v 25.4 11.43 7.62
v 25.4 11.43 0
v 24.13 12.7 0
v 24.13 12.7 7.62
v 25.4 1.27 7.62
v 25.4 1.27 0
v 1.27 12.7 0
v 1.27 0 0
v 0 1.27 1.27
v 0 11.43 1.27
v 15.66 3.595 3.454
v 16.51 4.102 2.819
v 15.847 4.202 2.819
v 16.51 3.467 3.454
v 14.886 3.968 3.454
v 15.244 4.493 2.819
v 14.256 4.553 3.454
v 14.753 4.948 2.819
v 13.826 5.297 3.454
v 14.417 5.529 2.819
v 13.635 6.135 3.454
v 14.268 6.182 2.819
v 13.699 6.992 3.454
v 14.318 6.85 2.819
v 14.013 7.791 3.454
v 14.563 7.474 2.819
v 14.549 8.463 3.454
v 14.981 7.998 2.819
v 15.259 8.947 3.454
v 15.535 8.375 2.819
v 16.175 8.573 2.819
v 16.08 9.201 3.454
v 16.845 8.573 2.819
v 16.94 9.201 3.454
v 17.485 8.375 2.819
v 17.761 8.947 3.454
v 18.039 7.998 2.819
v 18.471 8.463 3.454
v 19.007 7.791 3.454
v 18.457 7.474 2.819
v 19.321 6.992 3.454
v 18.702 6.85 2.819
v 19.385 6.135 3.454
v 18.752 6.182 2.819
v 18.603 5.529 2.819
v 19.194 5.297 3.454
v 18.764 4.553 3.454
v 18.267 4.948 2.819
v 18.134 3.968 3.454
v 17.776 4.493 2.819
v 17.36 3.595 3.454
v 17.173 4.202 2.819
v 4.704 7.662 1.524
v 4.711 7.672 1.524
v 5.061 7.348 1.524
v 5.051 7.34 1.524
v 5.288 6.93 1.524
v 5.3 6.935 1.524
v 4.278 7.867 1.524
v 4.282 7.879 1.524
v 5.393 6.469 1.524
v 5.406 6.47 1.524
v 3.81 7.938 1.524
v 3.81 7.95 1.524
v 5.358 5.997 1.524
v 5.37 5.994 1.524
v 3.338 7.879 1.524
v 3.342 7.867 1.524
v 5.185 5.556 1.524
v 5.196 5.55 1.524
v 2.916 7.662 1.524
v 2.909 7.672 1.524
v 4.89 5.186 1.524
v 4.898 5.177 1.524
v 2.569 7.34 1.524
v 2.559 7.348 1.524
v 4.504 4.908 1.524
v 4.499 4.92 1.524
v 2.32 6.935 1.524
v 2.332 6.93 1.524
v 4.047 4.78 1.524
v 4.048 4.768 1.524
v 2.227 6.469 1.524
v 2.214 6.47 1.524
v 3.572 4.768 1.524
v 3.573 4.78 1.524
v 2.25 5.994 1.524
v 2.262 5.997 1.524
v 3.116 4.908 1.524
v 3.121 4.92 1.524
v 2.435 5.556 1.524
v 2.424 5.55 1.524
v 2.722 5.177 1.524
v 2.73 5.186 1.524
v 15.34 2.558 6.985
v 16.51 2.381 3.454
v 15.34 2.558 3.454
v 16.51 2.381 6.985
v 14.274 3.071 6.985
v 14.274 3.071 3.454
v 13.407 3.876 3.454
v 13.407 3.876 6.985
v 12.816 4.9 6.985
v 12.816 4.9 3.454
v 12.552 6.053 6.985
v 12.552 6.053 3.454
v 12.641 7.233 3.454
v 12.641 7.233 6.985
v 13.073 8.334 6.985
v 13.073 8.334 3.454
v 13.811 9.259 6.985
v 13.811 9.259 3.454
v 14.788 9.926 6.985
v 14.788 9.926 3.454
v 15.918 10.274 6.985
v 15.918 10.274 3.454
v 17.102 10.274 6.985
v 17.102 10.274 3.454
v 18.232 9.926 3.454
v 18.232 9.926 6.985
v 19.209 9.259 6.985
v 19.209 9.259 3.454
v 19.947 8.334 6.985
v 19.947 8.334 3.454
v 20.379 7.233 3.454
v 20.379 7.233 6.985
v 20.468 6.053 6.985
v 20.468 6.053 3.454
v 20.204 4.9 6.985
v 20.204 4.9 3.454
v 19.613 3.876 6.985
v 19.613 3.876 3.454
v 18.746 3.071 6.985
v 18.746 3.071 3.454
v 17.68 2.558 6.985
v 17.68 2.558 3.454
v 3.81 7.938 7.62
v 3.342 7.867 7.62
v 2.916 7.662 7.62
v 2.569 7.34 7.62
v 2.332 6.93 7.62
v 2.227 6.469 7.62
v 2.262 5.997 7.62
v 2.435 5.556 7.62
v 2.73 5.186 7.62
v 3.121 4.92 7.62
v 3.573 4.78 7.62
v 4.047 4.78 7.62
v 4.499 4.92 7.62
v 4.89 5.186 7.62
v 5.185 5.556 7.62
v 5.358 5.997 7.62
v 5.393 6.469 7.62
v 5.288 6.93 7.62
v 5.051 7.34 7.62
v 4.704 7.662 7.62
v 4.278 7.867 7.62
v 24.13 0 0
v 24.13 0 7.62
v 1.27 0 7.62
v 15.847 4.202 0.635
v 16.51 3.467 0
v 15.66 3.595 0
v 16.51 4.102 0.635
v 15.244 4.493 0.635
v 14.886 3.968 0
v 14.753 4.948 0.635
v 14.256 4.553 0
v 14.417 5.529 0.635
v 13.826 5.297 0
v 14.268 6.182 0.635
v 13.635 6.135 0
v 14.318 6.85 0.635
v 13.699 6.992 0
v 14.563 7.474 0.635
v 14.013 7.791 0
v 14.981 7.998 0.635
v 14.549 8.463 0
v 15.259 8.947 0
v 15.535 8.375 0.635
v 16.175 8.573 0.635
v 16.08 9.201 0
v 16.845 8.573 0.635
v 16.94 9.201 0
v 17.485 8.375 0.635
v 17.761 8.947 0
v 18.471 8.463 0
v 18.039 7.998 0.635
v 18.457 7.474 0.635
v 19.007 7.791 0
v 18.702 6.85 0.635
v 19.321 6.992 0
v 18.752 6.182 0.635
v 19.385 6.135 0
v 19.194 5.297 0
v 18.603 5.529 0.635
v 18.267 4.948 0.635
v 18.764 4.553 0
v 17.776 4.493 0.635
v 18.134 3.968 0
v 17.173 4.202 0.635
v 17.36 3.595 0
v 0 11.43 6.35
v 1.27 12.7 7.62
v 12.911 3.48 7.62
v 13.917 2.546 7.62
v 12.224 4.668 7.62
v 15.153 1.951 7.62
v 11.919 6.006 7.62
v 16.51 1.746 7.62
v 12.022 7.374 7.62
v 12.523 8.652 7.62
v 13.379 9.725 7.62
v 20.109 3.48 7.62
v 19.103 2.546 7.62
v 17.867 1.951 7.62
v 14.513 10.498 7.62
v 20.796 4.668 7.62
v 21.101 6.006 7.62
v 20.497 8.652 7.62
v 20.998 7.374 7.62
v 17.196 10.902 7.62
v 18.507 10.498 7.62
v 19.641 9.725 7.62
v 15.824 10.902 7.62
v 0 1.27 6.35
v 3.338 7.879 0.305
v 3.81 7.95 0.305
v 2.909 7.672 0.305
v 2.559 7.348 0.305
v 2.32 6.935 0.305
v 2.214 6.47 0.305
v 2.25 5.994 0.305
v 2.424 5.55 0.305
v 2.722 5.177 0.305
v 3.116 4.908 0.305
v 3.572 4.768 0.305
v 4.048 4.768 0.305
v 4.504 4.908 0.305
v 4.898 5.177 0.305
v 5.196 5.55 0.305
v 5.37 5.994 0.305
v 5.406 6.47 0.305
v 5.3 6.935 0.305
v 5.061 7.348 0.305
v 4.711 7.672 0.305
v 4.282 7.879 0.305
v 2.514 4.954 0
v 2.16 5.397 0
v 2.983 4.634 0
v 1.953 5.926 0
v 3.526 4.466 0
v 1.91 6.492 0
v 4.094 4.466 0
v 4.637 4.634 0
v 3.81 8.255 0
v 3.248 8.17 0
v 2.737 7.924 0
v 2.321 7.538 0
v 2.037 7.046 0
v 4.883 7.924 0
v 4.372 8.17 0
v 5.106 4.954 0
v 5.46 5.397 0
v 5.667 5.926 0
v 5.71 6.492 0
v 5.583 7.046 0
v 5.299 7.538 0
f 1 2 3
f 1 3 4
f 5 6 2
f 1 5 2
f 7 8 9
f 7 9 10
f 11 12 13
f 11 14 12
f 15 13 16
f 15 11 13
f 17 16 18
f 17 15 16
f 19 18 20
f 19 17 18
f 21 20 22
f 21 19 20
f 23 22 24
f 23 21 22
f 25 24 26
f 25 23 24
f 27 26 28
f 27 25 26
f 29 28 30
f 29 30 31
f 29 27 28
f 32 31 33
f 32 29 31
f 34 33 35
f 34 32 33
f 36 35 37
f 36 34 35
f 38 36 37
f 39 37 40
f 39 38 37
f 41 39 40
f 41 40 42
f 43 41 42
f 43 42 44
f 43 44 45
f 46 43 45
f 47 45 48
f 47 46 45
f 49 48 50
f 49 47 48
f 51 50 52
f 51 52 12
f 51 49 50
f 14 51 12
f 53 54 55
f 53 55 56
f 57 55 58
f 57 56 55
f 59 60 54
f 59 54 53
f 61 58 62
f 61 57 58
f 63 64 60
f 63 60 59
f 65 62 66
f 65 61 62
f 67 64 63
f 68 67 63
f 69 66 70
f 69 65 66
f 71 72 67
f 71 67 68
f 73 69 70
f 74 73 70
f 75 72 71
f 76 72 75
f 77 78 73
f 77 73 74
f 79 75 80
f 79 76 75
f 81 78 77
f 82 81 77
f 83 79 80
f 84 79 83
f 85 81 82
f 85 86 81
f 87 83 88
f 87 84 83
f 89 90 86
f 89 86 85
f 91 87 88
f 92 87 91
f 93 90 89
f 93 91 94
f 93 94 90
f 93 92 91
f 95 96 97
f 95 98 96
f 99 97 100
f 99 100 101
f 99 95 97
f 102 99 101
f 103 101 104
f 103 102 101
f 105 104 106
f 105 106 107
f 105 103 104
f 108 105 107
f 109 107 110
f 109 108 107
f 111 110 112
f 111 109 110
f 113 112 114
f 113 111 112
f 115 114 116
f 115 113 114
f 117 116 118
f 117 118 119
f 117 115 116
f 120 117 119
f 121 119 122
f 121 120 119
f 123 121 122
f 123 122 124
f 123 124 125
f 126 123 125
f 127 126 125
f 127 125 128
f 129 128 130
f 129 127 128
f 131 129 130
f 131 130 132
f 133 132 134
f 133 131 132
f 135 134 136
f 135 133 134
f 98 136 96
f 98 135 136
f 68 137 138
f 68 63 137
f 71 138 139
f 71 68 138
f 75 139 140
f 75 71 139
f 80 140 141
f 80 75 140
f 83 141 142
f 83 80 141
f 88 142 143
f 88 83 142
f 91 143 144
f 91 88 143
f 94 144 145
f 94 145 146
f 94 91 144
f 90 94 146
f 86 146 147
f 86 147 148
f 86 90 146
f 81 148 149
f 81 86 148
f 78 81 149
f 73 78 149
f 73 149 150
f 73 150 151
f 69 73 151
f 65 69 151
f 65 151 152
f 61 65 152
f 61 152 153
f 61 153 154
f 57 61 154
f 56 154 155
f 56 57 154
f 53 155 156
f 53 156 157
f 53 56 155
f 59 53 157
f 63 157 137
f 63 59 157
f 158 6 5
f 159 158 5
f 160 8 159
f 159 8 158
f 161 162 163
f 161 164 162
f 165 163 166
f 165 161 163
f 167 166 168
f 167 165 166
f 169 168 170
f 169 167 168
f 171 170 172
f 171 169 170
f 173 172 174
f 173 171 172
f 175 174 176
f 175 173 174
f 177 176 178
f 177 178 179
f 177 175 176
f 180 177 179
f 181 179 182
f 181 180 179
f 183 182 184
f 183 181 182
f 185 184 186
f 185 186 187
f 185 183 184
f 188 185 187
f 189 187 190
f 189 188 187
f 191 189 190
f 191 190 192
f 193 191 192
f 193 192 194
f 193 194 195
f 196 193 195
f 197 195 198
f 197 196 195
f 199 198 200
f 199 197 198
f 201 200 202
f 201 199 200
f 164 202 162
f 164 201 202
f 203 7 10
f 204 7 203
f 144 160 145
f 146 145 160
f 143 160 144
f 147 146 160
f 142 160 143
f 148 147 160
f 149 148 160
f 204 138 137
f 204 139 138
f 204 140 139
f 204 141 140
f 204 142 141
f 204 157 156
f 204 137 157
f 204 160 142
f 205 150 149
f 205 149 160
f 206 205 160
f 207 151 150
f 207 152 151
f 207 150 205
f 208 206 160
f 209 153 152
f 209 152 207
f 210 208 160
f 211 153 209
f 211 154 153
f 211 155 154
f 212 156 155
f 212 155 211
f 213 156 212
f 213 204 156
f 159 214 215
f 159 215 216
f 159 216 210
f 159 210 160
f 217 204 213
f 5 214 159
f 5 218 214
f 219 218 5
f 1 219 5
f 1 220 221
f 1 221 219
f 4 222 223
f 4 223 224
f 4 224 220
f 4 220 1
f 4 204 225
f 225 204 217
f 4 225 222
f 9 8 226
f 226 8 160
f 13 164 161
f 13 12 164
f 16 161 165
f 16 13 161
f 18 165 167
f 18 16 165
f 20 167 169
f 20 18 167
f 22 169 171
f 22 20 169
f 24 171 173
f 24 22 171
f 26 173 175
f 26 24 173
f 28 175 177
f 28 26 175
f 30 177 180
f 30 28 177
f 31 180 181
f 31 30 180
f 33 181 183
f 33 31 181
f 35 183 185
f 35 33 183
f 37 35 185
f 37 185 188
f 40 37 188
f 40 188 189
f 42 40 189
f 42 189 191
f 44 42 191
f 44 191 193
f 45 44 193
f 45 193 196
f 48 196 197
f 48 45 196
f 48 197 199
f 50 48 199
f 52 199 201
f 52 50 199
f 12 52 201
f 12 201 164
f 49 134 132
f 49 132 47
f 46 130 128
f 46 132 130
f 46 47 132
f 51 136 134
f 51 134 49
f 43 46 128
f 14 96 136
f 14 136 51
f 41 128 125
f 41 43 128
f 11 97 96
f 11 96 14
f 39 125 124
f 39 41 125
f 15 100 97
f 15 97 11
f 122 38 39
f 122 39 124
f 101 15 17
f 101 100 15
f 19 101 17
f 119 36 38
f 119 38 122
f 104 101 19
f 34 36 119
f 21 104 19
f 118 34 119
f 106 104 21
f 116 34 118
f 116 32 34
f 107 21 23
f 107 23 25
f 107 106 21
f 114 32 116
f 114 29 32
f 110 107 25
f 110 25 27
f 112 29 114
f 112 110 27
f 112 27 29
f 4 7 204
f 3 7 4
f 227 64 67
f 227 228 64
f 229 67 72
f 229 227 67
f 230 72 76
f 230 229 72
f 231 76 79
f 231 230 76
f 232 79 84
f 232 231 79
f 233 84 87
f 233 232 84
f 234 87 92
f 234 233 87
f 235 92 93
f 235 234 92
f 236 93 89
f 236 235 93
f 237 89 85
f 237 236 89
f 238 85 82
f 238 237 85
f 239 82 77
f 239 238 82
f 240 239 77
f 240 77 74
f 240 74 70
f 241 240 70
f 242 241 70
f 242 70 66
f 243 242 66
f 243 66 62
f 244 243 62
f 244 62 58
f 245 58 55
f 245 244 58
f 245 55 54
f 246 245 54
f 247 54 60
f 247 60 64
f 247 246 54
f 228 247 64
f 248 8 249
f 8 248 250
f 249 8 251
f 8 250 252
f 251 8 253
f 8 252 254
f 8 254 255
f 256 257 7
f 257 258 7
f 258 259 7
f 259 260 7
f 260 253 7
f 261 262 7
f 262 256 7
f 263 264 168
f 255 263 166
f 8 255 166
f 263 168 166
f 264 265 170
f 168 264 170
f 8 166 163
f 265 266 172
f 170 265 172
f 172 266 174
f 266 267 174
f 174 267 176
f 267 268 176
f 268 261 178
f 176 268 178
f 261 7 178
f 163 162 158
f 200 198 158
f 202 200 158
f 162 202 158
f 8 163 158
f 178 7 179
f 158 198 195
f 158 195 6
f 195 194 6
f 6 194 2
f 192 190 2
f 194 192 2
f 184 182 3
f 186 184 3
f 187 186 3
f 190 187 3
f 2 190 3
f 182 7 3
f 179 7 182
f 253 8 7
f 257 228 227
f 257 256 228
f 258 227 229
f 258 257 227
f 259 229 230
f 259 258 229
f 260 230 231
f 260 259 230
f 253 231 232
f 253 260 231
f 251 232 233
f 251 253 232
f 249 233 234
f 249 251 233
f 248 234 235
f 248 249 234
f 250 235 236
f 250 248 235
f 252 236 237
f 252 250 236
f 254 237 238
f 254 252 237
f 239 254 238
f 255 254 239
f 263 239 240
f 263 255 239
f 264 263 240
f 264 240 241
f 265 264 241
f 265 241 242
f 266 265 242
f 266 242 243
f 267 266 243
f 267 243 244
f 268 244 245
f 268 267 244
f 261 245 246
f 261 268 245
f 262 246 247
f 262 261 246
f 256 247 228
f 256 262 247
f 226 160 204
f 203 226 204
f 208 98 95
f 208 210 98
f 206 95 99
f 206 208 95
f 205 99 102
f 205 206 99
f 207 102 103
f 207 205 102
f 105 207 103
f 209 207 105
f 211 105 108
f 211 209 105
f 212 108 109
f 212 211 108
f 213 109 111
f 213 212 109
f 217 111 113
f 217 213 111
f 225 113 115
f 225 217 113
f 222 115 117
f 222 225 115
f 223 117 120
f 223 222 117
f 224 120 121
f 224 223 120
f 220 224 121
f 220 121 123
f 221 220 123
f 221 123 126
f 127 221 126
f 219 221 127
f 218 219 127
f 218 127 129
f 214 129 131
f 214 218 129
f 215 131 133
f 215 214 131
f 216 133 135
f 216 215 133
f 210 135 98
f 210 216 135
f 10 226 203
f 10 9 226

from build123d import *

# Parameters (mm, degrees)
SKETCH1_W      = 25.4
SKETCH1_H      = 12.7
SKETCH1_R      = 1.27
EXTRUDE1_DEPTH = 7.62
CHAMFER1_SIZE  = 1.27


with BuildPart() as part:
    # Sketch1 → Extrude1 (new body)
    with BuildSketch(Plane.XY):
        with Locations((12.7, 6.35)):
            Rectangle(SKETCH1_W, SKETCH1_H)
        with Locations((16.51, 6.35)):
            Circle(SKETCH1_R, mode=Mode.SUBTRACT)
    extrude(amount=EXTRUDE1_DEPTH)

    # Chamfer1
    chamfer1_edges = [part.edges().sort_by_distance(p)[0] for p in [
        (0, 6.35, 7.62),
        (0, 6.35, 0),
        (0, 12.7, 3.81),
        (25.4, 12.7, 3.81),
        (25.4, 0, 3.81),
        (0, 0, 3.81),
    ]]
    chamfer(chamfer1_edges, length=CHAMFER1_SIZE)

    # Sketch2 → CBORE for #8 Socket Head Cap Screw1 (revolve, cut)
    with BuildSketch(Plane(origin=(16.51, 6.35, 7.62), x_dir=(0, -1, 0), z_dir=(1, 0, 0))):
        Polygon((0, 0), (0, 7.62), (2.8829, 7.62), (2.2479, 6.985), (2.2479, 4.8006), (2.8829, 4.1656), (3.96875, 4.1656), (3.96875, 0.635), (4.60375, 0), align=None)
    revolve(axis=Axis((16.51, 6.35, 13.97), (0, 0, -1)), mode=Mode.SUBTRACT)

    # Sketch4 → CBORE for #4 Socket Head Cap Screw1 (revolve, cut)
    with BuildSketch(Plane(origin=(3.81, 6.35, 0), x_dir=(0, 1, 0), z_dir=(1, 0, 0))):
        Polygon((0, 0), (0, 7.62), (1.5875, 7.62), (1.5875, 1.524), (1.6002, 1.524), (1.6002, 0.3048), (1.905, 0), align=None)
    revolve(axis=Axis((3.81, 6.35, -6.35), (0, 0, 1)), mode=Mode.SUBTRACT)


solid = part.part
